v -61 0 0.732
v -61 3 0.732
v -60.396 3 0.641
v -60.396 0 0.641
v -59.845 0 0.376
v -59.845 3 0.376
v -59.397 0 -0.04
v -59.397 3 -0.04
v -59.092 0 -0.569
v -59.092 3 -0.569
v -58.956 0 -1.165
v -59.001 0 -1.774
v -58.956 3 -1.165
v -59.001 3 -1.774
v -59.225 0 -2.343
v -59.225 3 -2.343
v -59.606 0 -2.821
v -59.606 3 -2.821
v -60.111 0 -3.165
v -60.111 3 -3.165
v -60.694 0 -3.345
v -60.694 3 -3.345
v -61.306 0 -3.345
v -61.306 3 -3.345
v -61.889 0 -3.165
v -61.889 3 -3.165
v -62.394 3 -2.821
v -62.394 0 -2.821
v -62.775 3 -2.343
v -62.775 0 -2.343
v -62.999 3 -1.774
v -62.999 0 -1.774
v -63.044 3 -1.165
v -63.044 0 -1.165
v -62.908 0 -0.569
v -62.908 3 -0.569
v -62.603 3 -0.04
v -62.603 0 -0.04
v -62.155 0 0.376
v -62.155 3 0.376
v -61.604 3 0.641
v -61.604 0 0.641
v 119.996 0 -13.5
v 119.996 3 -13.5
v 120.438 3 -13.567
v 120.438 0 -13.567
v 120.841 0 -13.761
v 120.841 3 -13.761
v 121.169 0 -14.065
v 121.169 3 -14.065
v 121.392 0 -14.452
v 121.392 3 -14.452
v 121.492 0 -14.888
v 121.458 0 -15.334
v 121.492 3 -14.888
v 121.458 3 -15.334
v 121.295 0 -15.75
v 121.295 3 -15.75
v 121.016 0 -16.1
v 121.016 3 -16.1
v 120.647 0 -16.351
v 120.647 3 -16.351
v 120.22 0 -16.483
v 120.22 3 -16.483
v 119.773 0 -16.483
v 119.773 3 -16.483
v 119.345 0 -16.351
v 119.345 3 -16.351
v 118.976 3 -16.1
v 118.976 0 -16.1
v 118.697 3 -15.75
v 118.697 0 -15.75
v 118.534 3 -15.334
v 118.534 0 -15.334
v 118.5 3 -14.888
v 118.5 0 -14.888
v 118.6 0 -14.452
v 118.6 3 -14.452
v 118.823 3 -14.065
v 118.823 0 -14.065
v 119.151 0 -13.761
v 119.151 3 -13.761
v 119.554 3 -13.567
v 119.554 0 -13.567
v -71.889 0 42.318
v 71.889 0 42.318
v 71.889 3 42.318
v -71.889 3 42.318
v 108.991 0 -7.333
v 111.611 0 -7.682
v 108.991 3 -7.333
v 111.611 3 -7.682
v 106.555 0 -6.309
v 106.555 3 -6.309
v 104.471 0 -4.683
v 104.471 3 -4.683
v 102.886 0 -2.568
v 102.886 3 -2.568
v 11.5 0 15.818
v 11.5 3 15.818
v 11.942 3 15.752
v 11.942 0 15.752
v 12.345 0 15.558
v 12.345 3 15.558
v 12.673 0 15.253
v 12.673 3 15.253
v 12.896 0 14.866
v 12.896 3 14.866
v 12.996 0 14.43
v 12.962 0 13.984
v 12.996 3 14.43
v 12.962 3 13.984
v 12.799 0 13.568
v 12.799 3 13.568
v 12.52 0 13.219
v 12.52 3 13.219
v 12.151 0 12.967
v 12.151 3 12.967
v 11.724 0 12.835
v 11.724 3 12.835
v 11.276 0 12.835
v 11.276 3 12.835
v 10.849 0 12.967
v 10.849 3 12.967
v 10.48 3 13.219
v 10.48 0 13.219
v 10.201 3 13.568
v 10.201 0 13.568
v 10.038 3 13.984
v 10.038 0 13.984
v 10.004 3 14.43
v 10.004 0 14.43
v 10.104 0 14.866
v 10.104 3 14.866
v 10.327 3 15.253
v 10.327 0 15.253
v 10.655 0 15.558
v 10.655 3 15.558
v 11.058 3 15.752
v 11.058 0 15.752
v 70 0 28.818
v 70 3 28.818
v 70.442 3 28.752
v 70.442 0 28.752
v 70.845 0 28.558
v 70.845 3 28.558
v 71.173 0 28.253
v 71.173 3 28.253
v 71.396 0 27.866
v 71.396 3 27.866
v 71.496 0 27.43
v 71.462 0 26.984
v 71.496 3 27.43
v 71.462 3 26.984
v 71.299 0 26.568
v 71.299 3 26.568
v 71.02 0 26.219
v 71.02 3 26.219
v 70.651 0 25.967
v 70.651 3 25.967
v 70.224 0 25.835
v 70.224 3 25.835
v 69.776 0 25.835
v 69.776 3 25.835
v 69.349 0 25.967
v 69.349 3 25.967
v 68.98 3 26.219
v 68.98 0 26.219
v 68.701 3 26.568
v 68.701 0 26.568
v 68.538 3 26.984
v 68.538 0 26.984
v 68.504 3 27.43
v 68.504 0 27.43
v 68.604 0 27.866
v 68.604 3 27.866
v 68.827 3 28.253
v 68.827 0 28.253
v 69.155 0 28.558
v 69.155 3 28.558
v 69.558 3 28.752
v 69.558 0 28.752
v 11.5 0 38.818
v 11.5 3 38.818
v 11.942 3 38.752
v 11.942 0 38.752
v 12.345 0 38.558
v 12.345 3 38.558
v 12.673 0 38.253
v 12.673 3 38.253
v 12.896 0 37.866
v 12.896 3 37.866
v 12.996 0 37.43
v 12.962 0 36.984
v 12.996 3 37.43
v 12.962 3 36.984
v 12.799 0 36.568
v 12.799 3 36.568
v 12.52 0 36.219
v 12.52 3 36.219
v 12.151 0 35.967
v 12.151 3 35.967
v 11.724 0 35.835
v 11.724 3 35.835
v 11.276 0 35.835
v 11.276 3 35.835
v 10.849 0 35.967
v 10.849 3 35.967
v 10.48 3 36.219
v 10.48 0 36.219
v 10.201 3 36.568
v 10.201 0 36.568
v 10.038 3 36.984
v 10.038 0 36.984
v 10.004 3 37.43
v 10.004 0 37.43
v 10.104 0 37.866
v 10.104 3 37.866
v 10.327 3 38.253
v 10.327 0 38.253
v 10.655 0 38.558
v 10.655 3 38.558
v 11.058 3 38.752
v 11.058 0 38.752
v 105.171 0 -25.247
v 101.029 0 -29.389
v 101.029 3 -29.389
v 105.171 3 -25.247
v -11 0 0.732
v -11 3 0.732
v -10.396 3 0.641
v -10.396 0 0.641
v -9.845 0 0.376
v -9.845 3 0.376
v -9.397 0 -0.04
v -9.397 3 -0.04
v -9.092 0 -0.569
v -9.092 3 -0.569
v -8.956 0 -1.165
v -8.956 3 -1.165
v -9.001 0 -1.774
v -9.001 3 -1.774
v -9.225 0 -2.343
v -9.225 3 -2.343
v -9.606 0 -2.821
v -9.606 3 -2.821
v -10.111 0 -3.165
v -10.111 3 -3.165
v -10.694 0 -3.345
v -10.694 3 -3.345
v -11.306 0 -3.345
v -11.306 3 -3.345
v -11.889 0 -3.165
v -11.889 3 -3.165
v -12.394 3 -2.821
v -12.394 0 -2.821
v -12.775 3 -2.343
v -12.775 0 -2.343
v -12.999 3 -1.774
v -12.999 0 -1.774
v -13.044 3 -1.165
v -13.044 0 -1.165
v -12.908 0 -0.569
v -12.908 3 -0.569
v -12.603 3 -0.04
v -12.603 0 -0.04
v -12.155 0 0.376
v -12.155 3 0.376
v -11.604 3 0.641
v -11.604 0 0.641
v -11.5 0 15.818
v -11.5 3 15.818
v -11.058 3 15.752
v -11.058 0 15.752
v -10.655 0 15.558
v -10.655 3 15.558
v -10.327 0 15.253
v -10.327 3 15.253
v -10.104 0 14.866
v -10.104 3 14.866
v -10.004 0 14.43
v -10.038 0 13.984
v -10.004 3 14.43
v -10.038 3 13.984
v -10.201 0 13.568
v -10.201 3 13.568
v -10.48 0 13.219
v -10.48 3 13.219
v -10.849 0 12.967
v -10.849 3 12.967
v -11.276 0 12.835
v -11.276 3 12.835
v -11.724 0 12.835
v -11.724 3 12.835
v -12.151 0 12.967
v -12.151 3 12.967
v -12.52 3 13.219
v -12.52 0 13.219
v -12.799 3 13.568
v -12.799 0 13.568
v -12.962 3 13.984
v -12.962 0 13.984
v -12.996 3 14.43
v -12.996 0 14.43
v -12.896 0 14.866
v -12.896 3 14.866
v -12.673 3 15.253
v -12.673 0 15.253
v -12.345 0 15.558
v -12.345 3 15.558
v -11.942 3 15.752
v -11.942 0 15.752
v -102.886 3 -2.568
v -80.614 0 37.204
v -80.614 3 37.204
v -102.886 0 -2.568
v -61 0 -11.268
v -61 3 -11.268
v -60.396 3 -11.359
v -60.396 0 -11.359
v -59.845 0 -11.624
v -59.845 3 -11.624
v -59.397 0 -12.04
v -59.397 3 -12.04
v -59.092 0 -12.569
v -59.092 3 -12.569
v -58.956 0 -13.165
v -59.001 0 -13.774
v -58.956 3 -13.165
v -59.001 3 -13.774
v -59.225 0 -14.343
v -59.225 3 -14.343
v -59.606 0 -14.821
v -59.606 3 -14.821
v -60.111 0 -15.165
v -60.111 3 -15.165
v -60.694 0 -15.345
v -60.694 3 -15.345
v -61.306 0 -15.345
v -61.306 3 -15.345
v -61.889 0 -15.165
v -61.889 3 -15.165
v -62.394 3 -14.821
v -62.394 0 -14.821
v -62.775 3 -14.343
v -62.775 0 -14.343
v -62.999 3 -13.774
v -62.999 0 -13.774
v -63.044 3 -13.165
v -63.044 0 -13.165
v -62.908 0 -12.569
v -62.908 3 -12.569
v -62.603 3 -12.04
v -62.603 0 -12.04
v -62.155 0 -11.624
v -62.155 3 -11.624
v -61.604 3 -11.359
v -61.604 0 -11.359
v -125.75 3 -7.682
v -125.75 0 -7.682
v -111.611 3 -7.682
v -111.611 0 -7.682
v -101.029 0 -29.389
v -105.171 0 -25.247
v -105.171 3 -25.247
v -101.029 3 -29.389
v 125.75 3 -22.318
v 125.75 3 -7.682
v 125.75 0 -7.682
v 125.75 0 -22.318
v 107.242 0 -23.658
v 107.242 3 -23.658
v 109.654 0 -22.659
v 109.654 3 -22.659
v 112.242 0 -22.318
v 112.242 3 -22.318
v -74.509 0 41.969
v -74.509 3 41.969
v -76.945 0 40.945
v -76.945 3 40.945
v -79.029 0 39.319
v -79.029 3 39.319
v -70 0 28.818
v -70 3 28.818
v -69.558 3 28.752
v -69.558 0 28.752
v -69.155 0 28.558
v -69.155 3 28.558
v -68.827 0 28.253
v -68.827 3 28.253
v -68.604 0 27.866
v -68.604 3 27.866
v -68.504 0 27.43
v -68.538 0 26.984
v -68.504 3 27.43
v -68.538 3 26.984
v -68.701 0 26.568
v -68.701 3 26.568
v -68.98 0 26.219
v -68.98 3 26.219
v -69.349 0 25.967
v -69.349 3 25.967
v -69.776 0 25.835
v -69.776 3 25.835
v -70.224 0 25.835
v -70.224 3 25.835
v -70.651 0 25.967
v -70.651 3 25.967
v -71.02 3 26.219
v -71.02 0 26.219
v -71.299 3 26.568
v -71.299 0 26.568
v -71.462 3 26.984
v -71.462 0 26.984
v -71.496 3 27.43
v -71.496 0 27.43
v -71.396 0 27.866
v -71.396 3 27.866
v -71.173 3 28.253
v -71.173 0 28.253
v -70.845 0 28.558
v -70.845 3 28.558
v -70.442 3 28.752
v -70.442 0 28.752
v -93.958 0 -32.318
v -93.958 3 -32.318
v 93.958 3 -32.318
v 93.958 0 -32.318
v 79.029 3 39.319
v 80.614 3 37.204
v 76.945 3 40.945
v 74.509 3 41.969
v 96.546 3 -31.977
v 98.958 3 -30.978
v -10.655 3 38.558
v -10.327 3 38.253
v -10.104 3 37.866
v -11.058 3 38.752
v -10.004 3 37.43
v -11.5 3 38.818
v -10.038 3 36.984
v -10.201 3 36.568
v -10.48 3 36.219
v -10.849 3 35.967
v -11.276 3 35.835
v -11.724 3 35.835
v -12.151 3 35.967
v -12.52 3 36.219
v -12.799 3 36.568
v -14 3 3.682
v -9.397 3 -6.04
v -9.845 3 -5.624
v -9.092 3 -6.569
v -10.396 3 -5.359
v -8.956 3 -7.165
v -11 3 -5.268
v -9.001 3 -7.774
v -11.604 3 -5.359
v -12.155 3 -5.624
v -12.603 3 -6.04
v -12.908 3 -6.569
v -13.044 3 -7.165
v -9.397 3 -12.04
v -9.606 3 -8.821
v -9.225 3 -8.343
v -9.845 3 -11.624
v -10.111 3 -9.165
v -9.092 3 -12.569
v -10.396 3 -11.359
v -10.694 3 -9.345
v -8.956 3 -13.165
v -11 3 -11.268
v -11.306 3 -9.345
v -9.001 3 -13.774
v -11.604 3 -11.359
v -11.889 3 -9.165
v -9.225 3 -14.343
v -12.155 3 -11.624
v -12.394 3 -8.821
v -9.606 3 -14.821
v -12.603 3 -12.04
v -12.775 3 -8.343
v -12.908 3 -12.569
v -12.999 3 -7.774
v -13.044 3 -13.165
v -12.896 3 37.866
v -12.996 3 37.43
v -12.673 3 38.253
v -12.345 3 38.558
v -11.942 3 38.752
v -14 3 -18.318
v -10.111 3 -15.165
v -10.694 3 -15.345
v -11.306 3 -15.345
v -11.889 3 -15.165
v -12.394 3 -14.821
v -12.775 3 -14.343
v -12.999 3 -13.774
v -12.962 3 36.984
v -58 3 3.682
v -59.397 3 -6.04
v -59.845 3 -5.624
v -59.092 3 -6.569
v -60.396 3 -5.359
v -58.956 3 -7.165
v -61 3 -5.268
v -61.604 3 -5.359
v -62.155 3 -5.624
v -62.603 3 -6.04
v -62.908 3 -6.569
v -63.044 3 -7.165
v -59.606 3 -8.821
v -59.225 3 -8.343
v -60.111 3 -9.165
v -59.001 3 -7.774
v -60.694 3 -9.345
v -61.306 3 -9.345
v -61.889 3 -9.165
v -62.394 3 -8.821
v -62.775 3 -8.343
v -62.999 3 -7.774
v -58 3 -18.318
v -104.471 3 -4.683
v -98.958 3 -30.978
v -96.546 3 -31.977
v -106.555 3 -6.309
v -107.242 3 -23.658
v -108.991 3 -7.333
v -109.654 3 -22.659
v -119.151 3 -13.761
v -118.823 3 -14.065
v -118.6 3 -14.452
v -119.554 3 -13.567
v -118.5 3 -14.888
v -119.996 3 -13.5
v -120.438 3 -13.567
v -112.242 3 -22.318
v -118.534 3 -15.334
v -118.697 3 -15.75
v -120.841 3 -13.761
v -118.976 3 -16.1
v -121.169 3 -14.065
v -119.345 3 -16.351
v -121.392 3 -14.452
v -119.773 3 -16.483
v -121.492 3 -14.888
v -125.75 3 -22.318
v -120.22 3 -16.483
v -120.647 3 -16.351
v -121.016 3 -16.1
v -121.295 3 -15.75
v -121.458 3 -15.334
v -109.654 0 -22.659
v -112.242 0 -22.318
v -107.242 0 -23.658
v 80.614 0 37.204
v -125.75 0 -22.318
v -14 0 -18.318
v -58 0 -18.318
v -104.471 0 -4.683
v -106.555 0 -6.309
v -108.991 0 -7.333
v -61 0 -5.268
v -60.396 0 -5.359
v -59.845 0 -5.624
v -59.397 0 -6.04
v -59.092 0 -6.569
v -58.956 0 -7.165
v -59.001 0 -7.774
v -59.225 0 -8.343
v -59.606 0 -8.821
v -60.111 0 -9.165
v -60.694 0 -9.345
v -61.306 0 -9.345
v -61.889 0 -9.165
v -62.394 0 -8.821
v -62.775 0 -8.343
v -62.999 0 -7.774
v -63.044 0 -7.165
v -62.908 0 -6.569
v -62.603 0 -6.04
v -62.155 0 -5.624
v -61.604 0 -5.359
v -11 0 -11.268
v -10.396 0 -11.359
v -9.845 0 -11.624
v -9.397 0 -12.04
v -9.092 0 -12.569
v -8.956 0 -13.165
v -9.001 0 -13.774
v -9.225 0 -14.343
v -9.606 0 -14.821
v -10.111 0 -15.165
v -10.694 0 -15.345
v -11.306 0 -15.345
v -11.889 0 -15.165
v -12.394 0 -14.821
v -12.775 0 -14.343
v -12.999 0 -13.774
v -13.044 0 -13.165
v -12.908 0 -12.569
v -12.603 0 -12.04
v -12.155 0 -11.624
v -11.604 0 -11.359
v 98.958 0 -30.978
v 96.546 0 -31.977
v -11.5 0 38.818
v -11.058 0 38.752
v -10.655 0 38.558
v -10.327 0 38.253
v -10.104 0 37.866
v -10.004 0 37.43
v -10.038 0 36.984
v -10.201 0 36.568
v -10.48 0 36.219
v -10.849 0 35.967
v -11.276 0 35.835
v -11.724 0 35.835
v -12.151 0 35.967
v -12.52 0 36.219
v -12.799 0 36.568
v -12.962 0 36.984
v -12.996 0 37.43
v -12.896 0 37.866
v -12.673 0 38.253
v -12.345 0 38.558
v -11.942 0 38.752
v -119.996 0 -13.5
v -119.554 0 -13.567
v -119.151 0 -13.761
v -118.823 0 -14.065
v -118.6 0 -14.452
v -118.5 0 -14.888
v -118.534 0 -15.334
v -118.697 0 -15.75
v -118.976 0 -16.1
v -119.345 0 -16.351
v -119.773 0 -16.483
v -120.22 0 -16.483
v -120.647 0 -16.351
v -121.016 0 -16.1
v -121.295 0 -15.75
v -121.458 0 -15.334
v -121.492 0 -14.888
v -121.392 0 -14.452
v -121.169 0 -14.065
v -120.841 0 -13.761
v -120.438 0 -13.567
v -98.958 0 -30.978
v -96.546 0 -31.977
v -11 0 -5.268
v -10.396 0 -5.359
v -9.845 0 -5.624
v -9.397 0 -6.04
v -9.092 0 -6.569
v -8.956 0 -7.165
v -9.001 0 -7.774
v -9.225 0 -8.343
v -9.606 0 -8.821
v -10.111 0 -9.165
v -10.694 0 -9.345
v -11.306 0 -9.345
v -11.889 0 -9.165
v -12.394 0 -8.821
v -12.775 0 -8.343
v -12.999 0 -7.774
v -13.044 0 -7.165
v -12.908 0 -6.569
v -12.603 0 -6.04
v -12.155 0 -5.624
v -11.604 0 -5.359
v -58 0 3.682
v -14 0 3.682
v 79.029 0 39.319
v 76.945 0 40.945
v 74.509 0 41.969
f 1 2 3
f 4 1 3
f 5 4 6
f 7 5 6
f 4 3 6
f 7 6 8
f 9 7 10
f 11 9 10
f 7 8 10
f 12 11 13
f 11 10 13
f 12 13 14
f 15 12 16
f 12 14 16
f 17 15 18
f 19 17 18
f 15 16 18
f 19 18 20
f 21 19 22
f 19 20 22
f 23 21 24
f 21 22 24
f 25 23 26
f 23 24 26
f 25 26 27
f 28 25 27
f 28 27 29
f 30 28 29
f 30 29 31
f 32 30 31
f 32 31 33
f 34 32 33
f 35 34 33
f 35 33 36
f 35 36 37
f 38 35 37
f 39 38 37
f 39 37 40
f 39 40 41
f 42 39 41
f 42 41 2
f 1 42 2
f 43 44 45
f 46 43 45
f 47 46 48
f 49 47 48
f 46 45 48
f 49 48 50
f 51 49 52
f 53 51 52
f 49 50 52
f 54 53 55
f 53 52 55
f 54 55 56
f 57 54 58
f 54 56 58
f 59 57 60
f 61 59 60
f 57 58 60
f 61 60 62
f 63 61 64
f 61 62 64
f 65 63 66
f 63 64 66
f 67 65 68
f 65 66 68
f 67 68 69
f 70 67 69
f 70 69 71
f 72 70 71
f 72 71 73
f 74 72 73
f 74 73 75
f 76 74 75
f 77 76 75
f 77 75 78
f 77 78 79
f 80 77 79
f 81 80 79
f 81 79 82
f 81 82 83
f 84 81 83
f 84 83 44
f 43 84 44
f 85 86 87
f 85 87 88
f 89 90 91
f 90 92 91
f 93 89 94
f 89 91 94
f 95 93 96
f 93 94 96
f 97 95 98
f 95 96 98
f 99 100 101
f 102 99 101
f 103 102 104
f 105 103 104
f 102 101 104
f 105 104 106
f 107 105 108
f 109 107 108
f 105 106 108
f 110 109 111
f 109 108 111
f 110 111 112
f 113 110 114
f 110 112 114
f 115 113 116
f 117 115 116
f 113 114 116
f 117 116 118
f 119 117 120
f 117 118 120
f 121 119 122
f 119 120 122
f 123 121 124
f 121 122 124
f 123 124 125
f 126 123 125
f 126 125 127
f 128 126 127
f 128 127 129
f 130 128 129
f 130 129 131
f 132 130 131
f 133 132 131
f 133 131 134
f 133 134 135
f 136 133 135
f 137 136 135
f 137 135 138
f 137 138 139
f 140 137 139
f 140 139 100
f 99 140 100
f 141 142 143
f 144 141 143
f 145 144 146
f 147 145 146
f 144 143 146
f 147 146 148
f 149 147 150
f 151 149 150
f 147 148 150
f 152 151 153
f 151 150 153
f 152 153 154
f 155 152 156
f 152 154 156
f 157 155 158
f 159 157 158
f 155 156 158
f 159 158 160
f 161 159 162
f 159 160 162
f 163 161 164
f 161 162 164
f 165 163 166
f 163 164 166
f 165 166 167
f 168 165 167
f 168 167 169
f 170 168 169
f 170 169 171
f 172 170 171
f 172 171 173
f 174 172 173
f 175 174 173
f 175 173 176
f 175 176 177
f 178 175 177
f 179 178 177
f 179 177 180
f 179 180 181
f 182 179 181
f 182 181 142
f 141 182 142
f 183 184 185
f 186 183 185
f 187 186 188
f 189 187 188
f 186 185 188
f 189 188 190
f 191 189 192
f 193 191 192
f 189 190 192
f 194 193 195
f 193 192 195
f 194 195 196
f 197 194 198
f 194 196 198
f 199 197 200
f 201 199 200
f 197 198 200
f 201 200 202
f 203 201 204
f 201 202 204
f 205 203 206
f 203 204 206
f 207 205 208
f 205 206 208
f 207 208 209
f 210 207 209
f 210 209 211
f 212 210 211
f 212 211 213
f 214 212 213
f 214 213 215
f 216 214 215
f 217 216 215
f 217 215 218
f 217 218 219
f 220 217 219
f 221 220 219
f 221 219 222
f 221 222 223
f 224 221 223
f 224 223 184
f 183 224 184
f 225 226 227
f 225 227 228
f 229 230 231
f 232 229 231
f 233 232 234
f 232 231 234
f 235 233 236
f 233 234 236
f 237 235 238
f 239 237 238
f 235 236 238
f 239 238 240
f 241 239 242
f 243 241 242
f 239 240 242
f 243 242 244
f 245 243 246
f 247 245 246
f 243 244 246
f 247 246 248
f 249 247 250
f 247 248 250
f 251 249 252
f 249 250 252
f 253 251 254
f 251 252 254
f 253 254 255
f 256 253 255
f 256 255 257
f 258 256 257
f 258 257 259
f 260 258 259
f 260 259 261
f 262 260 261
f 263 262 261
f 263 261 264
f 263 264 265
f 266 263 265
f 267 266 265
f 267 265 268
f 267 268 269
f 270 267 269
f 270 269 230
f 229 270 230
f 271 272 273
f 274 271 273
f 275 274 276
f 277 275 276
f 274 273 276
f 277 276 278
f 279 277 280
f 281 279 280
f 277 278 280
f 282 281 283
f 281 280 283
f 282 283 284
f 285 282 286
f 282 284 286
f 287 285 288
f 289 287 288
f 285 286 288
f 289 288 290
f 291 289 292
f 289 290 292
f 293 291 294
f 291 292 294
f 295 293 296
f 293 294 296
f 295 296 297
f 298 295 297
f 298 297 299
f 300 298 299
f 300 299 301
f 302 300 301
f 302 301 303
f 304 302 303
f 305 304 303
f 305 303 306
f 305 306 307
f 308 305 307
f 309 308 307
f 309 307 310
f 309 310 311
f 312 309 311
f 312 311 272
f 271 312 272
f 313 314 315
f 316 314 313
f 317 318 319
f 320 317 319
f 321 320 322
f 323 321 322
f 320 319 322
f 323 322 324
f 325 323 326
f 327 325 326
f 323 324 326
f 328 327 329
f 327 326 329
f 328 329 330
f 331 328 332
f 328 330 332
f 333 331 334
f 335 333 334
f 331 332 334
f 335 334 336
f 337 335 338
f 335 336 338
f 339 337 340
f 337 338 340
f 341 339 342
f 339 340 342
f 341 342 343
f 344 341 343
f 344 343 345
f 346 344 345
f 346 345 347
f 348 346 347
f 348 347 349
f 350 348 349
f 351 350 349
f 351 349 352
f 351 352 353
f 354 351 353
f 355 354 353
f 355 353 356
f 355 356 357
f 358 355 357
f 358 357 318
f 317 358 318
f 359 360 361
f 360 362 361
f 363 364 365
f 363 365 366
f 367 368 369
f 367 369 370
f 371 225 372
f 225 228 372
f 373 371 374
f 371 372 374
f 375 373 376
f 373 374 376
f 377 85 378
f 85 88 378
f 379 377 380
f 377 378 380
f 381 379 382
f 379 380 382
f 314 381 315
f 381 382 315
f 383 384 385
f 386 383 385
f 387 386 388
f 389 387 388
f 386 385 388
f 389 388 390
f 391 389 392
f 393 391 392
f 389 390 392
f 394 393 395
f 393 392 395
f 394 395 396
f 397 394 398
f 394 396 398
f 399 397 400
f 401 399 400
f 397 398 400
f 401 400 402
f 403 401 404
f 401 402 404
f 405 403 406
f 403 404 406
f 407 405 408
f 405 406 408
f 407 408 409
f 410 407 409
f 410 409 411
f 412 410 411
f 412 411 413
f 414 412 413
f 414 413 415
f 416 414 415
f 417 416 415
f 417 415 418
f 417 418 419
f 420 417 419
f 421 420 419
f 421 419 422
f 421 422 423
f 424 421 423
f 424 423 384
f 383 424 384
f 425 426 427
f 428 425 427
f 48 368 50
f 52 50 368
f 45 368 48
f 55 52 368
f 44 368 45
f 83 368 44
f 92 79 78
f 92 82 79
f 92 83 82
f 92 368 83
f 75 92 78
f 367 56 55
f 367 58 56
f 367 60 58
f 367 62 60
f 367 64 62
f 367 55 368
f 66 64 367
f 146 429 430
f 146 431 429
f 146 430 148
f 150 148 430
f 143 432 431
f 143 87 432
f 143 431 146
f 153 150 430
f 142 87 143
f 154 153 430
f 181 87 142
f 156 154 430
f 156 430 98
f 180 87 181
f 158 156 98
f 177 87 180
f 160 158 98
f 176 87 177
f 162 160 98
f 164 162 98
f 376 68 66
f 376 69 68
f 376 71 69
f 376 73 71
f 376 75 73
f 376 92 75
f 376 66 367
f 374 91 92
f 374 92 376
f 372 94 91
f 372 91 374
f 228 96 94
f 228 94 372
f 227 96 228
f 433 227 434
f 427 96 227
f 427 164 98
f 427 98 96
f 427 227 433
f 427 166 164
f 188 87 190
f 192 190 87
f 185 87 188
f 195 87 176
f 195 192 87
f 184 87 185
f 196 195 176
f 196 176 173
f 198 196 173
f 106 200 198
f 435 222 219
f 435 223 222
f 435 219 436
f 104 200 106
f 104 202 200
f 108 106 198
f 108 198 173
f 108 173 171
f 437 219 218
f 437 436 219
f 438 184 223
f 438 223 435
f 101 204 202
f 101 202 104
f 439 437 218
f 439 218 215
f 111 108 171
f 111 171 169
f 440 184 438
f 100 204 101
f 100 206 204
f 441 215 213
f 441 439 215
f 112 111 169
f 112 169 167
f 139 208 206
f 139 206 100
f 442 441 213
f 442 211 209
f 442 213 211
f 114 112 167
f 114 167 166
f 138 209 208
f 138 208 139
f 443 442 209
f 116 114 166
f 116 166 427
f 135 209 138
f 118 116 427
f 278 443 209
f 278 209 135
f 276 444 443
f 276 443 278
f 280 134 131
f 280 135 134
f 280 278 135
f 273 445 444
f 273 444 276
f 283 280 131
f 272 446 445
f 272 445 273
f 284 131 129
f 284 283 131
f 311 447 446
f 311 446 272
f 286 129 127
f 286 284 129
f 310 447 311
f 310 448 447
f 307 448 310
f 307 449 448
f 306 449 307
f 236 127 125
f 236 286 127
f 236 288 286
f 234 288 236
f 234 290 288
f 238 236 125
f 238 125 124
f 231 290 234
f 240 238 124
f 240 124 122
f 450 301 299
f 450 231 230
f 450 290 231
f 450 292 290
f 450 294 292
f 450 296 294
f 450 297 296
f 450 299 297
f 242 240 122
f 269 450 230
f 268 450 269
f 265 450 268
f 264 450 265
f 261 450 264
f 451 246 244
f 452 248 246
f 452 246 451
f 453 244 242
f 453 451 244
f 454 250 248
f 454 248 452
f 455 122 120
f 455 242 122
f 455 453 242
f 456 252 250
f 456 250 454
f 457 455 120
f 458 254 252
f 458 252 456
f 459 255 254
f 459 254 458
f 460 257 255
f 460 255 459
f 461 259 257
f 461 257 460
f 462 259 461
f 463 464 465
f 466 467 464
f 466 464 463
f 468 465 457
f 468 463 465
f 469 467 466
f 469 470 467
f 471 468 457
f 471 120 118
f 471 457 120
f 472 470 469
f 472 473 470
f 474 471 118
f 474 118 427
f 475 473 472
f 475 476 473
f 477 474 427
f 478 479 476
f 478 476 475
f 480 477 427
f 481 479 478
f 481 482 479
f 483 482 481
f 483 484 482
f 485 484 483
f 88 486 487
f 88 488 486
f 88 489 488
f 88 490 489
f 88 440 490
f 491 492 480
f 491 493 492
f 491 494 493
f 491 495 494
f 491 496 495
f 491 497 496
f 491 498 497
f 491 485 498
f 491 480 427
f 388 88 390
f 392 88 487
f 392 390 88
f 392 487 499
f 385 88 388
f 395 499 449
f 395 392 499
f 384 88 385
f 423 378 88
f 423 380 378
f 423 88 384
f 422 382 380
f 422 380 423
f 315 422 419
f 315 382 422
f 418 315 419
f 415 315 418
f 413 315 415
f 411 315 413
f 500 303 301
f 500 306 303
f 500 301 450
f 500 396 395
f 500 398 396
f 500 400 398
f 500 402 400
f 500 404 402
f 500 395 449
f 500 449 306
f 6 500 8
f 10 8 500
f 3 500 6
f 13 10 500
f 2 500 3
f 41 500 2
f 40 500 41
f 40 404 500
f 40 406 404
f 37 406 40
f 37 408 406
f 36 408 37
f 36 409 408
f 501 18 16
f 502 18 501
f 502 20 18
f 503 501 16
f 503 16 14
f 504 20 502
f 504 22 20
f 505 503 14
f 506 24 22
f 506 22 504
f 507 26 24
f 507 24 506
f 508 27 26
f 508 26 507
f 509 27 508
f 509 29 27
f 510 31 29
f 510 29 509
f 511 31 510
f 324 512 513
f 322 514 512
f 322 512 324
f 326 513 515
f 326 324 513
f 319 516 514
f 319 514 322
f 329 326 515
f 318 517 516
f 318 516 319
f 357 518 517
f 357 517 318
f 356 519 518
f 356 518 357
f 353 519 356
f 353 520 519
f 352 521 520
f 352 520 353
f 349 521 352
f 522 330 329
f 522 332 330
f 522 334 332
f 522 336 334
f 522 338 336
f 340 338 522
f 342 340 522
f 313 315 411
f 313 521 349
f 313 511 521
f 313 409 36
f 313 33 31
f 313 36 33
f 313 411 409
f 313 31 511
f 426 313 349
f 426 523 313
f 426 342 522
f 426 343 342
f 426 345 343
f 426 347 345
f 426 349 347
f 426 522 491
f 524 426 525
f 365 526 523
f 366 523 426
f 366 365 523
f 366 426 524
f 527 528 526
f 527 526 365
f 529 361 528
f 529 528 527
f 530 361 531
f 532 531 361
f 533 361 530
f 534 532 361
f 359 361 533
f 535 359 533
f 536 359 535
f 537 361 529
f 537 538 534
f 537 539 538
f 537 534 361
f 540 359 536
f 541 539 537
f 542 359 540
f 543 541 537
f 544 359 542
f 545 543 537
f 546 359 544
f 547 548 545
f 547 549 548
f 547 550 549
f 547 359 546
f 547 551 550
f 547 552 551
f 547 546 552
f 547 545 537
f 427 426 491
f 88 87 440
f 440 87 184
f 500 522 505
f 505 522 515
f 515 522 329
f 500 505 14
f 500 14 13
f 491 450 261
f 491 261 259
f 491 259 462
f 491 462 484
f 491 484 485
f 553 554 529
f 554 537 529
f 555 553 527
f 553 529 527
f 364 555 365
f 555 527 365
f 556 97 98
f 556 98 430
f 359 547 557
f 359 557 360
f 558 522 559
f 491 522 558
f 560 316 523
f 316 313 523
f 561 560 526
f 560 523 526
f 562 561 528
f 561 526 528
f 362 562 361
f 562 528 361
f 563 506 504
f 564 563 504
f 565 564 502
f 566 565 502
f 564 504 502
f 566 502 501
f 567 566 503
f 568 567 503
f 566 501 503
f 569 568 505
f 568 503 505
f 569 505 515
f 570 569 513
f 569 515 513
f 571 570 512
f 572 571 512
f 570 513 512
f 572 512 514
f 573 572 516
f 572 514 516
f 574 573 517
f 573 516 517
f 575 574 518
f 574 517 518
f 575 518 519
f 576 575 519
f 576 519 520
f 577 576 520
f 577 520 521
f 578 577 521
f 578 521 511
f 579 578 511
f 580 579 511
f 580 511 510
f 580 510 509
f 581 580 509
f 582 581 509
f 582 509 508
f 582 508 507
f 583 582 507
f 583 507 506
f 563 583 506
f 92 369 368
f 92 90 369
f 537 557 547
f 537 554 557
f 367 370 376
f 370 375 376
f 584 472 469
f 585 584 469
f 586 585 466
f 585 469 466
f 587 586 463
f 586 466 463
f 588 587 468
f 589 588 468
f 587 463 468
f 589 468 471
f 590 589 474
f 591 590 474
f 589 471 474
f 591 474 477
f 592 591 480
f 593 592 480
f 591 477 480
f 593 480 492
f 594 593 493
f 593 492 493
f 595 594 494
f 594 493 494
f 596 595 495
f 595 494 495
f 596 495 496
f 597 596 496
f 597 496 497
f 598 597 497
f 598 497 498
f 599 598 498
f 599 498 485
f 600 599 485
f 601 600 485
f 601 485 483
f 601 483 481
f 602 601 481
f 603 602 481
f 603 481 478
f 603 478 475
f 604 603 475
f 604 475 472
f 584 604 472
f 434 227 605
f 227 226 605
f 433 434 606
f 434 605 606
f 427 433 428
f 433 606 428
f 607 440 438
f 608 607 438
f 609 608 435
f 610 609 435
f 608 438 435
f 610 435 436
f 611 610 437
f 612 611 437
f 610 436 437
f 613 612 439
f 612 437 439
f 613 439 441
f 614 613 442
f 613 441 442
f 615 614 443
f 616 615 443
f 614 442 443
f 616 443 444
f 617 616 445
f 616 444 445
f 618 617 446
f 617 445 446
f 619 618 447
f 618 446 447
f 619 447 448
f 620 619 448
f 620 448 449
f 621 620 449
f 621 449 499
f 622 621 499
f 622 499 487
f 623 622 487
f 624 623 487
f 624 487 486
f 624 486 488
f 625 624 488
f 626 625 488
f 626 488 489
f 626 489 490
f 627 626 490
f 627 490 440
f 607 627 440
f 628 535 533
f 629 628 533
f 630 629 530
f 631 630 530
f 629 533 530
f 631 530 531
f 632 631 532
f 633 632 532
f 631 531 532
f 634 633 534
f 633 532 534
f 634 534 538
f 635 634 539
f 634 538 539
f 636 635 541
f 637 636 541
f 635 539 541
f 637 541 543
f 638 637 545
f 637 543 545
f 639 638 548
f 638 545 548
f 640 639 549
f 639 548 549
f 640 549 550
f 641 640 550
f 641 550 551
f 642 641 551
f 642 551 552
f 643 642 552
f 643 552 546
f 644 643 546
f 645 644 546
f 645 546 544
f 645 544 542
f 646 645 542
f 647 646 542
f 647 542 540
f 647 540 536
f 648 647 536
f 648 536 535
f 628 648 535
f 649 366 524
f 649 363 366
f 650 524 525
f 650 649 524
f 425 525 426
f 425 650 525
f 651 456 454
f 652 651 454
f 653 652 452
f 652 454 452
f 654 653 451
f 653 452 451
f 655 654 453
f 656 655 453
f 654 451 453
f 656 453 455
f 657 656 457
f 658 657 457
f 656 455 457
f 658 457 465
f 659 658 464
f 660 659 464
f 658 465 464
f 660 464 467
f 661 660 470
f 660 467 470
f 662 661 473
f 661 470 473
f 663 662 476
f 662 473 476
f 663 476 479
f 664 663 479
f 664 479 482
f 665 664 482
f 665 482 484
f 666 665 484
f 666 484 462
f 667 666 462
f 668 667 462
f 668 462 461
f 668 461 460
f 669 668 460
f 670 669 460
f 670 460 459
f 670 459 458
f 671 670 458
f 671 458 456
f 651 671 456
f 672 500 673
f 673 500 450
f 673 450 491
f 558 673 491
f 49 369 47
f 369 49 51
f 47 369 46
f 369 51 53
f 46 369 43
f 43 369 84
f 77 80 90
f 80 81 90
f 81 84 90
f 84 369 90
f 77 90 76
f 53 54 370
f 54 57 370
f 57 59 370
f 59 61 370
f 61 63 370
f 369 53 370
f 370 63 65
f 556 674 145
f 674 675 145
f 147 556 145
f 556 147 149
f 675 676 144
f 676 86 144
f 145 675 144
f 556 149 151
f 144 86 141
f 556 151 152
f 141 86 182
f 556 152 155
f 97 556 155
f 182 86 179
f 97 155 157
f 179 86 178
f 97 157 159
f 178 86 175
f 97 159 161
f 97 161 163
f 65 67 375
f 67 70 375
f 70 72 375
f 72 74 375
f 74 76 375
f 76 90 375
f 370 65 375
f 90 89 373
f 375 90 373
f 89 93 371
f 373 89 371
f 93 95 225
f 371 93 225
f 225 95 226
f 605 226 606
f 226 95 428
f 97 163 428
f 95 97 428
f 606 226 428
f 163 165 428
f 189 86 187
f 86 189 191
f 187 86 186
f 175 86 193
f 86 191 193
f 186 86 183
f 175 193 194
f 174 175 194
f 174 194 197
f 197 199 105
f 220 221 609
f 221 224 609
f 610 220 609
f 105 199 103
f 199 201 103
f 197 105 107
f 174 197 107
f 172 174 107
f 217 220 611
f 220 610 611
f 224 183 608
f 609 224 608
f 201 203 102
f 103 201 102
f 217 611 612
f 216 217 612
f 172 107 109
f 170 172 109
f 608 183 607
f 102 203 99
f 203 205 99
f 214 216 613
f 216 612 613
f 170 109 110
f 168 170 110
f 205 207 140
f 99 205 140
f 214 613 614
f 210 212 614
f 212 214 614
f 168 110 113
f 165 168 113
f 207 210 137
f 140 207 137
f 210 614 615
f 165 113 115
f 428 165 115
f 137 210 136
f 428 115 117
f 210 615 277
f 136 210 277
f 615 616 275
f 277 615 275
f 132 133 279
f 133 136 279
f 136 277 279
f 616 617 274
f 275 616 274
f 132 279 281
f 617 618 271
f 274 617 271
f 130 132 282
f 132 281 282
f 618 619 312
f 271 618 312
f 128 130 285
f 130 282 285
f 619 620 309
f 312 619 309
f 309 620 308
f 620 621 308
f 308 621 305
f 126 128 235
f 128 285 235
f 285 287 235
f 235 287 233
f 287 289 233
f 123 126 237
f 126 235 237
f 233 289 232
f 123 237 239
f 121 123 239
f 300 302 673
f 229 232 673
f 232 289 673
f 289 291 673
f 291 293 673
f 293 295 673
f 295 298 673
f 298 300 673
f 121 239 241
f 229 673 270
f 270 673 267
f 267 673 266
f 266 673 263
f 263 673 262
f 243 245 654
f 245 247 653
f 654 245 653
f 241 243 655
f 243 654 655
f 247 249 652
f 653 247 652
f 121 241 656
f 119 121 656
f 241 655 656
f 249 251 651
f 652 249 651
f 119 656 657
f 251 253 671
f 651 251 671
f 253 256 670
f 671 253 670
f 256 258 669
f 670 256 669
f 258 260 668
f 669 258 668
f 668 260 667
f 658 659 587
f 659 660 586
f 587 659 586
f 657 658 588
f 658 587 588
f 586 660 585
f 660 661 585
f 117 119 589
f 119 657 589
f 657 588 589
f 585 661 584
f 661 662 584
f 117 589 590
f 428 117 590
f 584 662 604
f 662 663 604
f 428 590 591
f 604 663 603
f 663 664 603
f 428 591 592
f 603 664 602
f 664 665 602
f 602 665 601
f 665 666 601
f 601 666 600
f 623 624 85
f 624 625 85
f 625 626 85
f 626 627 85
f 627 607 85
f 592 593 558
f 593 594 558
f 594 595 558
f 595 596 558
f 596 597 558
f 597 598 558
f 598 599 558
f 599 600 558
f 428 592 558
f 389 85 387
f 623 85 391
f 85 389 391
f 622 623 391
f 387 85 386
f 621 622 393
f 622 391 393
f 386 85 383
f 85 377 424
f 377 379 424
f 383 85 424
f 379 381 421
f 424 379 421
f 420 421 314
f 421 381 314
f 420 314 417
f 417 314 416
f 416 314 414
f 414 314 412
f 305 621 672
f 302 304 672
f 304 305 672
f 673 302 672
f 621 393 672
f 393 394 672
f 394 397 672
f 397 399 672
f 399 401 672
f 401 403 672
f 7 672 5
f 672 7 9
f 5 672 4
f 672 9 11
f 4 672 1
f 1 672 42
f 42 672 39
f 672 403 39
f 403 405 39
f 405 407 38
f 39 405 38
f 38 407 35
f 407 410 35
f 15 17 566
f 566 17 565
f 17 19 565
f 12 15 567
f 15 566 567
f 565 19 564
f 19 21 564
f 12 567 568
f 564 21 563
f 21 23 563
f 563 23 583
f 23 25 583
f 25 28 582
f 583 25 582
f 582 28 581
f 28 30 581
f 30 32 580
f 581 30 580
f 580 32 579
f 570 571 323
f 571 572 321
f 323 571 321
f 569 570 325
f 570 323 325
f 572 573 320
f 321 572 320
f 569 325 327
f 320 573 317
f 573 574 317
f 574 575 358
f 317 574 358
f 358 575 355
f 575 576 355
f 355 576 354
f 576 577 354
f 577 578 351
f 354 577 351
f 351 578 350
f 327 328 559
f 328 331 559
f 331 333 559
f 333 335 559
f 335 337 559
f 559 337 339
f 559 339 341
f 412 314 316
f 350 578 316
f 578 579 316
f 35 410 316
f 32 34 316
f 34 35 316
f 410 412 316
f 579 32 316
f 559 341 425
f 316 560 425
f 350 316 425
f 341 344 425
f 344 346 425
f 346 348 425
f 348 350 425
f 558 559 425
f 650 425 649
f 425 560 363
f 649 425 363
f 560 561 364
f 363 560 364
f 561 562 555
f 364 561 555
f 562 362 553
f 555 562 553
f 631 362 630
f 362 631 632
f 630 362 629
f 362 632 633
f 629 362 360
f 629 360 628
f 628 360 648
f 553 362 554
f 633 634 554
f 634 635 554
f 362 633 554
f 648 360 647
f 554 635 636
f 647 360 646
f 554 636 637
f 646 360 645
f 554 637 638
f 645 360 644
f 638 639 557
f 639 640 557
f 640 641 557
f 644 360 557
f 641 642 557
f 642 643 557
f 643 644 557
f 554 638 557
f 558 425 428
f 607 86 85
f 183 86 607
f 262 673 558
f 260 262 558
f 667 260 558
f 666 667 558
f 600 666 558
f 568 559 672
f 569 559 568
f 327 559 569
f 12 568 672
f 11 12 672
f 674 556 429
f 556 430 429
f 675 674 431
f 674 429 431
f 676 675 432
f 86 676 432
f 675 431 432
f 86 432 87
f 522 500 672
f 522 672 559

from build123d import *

# Parameters (mm, degrees)
SALIENTE_EXTRUIR1_DEPTH = 3
REDONDEO1_R             = 10
CROQUIS2_R              = 1.5
CROQUIS2_R_2            = 2.05
CROQUIS2_W              = 42
CROQUIS2_H              = 20
CORTAR_EXTRUIR1_DEPTH   = 135.610141171
CROQUIS3_W              = 4
CROQUIS3_H              = 14.636342218
CORTAR_EXTRUIR2_DEPTH   = 135.610141171
CROQUIS4_W              = 44
CROQUIS4_H              = 22
CORTAR_EXTRUIR3_DEPTH   = 131.820067673
CORTAR_EXTRUIR4_DEPTH   = 131.820067673
REDONDEO2_R             = 20
CORTAR_EXTRUIR5_DEPTH   = 10
REDONDEO3_R             = 10
CROQUIS7_W              = 14.636342218
CROQUIS7_H              = 3
SALIENTE_EXTRUIR2_DEPTH = 2
CROQUIS8_W              = 14.636342218
CROQUIS8_H              = 3
SALIENTE_EXTRUIR3_DEPTH = 2


with BuildPart() as part:
    # Croquis1 → Saliente-Extruir1 (new body)
    with BuildSketch(Plane(origin=(0, 0, 0), x_dir=(1, 0, 0), z_dir=(0, 1, 0))):
        Polygon((-88.1, 42.318171109), (88.1, 42.318171109), (108.1, 22.318171109), (127.75, 22.318171109), (127.75, 7.681828891), (105.75, 7.681828891), (77.75, -42.318171109), (-77.75, -42.318171109), (-105.75, 7.681828891), (-127.75, 7.681828891), (-127.75, 22.318171109), (-108.1, 22.318171109), align=None)
    extrude(amount=SALIENTE_EXTRUIR1_DEPTH)

    # Redondeo1
    redondeo1_edges = [part.edges().sort_by_distance(p)[0] for p in [
        (-88.1, 1.5, -42.318171109),
        (88.1, 1.5, -42.318171109),
        (108.1, 1.5, -22.318171109),
        (105.75, 1.5, -7.681828891),
        (77.75, 1.5, 42.318171109),
        (-77.75, 1.5, 42.318171109),
        (-105.75, 1.5, -7.681828891),
        (-108.1, 1.5, -22.318171109),
    ]]
    fillet(redondeo1_edges, radius=REDONDEO1_R)

    # Croquis2 → Cortar-Extruir1 (cut, through all)
    with BuildSketch(Plane(origin=(0, 3, 0), x_dir=(1, 0, 0), z_dir=(0, 1, 0))):
        with Locations(Location((70, -27.318171109, 0), (0, 0, 270))):
            Circle(CROQUIS2_R)
        with Locations(Location((-70, -27.318171109, 0), (0, 0, 270))):
            Circle(CROQUIS2_R)
        with Locations(Location((-119.996067812, 15, 0), (0, 0, 270))):
            Circle(CROQUIS2_R)
        with Locations(Location((119.996067812, 15, 0), (0, 0, 270))):
            Circle(CROQUIS2_R)
        with Locations(Location((-11.5, -14.318171109, 0), (0, 0, 270))):
            Circle(CROQUIS2_R)
        with Locations(Location((11.5, -14.318171109, 0), (0, 0, 270))):
            Circle(CROQUIS2_R)
        with Locations(Location((-11.5, -37.318171109, 0), (0, 0, 270))):
            Circle(CROQUIS2_R)
        with Locations(Location((11.5, -37.318171109, 0), (0, 0, 270))):
            Circle(CROQUIS2_R)
        with Locations(Location((-61, 7.318171109, 0), (0, 0, 270))):
            Circle(CROQUIS2_R_2)
        with Locations(Location((-11, 7.318171109, 0), (0, 0, 270))):
            Circle(CROQUIS2_R_2)
        with Locations(Location((-61, 13.318171109, 0), (0, 0, 270))):
            Circle(CROQUIS2_R_2)
        with Locations(Location((-61, 1.318171109, 0), (0, 0, 270))):
            Circle(CROQUIS2_R_2)
        with Locations(Location((-11, 13.318171109, 0), (0, 0, 270))):
            Circle(CROQUIS2_R_2)
        with Locations(Location((-11, 1.318171109, 0), (0, 0, 270))):
            Circle(CROQUIS2_R_2)
        with Locations((-36, 7.318171109)):
            Rectangle(CROQUIS2_W, CROQUIS2_H)
    extrude(amount=-CORTAR_EXTRUIR1_DEPTH, mode=Mode.SUBTRACT)

    # Croquis3 → Cortar-Extruir2 (cut, through all)
    with BuildSketch(Plane(origin=(0, 3, 0), x_dir=(1, 0, 0), z_dir=(0, 1, 0))):
        with Locations((-125.75, 15)):
            Rectangle(CROQUIS3_W, CROQUIS3_H)
        with Locations((125.75, 15)):
            Rectangle(CROQUIS3_W, CROQUIS3_H)
    extrude(amount=-CORTAR_EXTRUIR2_DEPTH, mode=Mode.SUBTRACT)

    # Croquis4 → Cortar-Extruir3 (cut, through all)
    with BuildSketch(Plane(origin=(0, 3, 0), x_dir=(1, 0, 0), z_dir=(0, 1, 0))):
        with Locations((-36, 7.318171109)):
            Rectangle(CROQUIS4_W, CROQUIS4_H)
    extrude(amount=-CORTAR_EXTRUIR3_DEPTH, mode=Mode.SUBTRACT)

    # Croquis5 → Cortar-Extruir4 (cut, through all)
    with BuildSketch(Plane(origin=(0, 3, 0), x_dir=(1, 0, 0), z_dir=(0, 1, 0))):
        Polygon((-63.75, 42.318171109), (-38.75, 32.318171109), (38.75, 32.318171109), (63.75, 42.318171109), align=None)
    extrude(amount=-CORTAR_EXTRUIR4_DEPTH, mode=Mode.SUBTRACT)

    # Redondeo2
    redondeo2_edges = [part.edges().sort_by_distance(p)[0] for p in [
        (-63.75, 1.5, -42.318171109),
        (63.75, 1.5, -42.318171109),
        (38.75, 1.5, -32.318171109),
        (-38.75, 1.5, -32.318171109),
    ]]
    fillet(redondeo2_edges, radius=REDONDEO2_R)

    # Croquis6 → Cortar-Extruir5 (cut)
    with BuildSketch(Plane(origin=(0, 3, 0), x_dir=(1, 0, 0), z_dir=(0, 1, 0))):
        Polygon((-34.898351929, 32.318171109), (-98.1, 32.318171109), (-98.1, 50.604425951), (105.42793471, 50.604425951), (105.42793471, 32.318171109), align=None)
    extrude(amount=-CORTAR_EXTRUIR5_DEPTH, mode=Mode.SUBTRACT)

    # Redondeo3
    redondeo3_edges = [part.edges().sort_by_distance(p)[0] for p in [
        (98.1, 1.5, -32.318171109),
        (-98.1, 1.5, -32.318171109),
    ]]
    fillet(redondeo3_edges, radius=REDONDEO3_R)

    # Croquis7 → Saliente-Extruir2 (add)
    with BuildSketch(Plane.ZY.offset(123.75)):
        with Locations((-15, 1.5)):
            Rectangle(CROQUIS7_W, CROQUIS7_H)
    extrude(amount=SALIENTE_EXTRUIR2_DEPTH)

    # Croquis8 → Saliente-Extruir3 (add)
    with BuildSketch(Plane(origin=(123.75, 0, 0), x_dir=(0, 0, -1), z_dir=(1, 0, 0))):
        with Locations((15, 1.5)):
            Rectangle(CROQUIS8_W, CROQUIS8_H)
    extrude(amount=SALIENTE_EXTRUIR3_DEPTH)


solid = part.part
